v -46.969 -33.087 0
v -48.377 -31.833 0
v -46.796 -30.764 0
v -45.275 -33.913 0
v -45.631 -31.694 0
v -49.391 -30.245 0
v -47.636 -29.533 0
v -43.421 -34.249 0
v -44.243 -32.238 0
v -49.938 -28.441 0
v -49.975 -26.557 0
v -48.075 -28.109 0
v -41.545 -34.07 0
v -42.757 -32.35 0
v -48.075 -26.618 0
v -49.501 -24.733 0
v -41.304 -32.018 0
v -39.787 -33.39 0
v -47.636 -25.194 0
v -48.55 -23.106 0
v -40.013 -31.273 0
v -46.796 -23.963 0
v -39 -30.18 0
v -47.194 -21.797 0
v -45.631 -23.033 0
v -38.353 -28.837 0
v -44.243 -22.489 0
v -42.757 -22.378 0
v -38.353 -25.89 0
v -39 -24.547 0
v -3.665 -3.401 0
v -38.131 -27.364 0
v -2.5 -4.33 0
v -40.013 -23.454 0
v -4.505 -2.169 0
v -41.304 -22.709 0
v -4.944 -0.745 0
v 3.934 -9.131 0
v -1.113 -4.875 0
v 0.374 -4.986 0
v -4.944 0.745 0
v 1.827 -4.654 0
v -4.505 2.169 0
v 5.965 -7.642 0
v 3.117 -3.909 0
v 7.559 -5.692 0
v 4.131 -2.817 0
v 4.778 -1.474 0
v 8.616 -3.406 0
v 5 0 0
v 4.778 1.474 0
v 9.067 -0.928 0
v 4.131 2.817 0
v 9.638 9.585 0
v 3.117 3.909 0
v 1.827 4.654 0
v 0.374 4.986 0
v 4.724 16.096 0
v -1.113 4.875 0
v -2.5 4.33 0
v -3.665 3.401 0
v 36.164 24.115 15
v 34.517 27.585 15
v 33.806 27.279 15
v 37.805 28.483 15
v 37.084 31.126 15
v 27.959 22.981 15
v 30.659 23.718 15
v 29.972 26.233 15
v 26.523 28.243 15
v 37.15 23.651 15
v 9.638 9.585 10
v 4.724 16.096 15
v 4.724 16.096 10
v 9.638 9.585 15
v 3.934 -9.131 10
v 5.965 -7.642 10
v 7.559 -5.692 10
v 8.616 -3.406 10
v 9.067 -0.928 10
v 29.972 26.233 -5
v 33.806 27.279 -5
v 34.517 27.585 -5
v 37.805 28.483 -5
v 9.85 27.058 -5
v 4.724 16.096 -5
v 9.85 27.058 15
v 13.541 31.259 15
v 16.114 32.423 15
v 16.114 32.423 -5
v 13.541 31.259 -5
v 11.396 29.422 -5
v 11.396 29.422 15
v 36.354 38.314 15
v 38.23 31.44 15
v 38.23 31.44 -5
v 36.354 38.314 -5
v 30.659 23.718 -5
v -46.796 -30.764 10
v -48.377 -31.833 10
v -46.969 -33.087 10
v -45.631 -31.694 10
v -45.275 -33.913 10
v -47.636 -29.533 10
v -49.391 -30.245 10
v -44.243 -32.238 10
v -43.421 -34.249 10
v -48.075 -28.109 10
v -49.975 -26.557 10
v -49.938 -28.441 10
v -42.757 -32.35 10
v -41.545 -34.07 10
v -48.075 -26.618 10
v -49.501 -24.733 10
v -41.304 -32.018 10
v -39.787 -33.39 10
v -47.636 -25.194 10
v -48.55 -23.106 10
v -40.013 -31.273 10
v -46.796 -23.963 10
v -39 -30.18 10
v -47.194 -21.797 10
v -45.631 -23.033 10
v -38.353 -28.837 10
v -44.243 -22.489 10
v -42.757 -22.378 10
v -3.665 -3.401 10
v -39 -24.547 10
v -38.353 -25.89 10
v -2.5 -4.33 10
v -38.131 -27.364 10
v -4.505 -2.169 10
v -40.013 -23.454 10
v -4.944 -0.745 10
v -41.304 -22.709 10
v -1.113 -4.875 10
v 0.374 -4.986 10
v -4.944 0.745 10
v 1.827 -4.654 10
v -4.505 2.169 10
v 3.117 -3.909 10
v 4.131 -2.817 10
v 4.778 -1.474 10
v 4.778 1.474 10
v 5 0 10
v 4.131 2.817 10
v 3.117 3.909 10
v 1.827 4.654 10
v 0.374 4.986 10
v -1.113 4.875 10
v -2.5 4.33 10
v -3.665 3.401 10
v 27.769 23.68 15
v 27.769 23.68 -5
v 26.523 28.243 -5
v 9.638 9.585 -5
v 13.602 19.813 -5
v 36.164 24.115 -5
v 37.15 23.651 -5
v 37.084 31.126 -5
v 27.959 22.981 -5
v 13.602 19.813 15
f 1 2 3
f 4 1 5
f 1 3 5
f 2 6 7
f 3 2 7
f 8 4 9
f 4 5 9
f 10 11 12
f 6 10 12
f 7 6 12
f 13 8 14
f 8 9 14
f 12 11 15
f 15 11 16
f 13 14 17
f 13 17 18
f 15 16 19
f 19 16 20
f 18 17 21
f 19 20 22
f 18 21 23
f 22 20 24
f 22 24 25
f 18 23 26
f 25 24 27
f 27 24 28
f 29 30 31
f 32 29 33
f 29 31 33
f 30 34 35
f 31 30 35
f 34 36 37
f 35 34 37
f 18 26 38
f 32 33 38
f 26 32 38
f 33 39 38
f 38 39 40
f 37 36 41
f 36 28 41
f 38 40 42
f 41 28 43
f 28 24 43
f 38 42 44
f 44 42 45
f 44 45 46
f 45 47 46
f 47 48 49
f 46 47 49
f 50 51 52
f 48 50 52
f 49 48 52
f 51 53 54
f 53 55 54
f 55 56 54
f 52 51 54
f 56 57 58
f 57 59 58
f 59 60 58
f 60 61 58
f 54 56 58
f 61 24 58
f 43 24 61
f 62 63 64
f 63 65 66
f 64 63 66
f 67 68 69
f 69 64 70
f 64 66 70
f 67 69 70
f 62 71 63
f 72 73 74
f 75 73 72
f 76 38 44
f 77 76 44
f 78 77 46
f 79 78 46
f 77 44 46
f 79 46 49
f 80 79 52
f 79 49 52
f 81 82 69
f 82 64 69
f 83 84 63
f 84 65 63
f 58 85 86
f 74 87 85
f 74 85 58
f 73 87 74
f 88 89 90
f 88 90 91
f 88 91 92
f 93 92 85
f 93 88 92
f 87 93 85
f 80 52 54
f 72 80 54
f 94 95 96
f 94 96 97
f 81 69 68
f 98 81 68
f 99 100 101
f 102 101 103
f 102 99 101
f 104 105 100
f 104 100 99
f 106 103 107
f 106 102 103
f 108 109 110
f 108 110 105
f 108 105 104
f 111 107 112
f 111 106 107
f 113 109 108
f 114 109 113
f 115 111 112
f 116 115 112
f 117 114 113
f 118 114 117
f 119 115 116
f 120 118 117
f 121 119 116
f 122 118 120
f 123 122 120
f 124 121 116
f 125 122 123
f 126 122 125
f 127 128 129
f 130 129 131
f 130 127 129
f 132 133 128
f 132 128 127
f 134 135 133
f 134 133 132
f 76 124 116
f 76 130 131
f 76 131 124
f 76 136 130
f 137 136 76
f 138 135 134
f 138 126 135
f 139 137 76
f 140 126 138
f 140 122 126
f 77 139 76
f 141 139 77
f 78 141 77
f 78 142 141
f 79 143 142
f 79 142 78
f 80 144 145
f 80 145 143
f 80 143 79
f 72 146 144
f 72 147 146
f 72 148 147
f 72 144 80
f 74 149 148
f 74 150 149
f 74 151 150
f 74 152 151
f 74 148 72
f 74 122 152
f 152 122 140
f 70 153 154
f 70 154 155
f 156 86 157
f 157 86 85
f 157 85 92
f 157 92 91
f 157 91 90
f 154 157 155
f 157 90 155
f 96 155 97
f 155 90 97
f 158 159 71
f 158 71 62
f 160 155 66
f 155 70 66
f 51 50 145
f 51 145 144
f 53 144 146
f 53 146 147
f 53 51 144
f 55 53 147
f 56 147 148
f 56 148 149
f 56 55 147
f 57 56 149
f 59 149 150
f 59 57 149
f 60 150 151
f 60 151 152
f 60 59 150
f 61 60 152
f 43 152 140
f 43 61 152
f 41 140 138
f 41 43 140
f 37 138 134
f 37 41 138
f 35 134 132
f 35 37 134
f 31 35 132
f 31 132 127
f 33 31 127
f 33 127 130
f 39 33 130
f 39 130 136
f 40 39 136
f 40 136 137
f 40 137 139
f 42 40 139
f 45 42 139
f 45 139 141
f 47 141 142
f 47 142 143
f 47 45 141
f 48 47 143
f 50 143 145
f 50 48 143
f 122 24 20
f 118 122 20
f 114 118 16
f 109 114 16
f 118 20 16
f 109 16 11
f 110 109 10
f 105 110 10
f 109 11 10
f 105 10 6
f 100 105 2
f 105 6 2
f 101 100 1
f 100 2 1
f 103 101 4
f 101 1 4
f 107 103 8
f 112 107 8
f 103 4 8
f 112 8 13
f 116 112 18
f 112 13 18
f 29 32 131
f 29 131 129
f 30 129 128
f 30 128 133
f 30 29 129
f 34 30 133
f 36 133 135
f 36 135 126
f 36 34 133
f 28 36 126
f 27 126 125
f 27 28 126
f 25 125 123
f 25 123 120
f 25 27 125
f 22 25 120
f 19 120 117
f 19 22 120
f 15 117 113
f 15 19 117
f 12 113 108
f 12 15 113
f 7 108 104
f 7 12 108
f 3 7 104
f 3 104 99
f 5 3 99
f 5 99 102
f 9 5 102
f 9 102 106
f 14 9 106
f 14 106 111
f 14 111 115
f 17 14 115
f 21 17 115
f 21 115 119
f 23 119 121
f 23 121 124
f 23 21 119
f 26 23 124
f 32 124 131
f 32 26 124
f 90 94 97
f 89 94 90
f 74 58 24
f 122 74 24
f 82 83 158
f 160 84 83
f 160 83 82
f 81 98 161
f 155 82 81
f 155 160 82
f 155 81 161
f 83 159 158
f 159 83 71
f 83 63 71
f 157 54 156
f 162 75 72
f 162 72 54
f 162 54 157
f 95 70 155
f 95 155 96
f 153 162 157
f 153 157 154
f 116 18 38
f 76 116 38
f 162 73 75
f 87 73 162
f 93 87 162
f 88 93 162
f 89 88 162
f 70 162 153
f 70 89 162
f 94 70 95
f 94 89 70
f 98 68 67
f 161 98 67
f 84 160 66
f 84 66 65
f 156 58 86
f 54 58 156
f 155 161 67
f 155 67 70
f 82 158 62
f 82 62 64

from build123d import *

# Parameters (mm, degrees)
SKETCH_1_R      = 5
EXTRUDE_1_DEPTH = 10
EXTRUDE_2_DEPTH = 10
EXTRUDE_3_DEPTH = 10


with BuildPart() as part:
    # 草图1 → 凸台-拉伸1 (new body)
    with BuildSketch(Plane.XY):
        with BuildLine():
            Line((10.207680571, 20.09846448), (-47.193739247, -21.796773851))
            ThreePointArc((-47.193739247, -21.796773851), (-48.938446672, -31.074098067), (-39.786963622, -33.389936271))
            Line((-39.786963622, -33.389936271), (3.933872673, -9.131154899))
            ThreePointArc((3.933872673, -9.131154899), (7.558896736, -5.692097923), (9.067445715, -0.928465662))
            Line((9.067445715, -0.928465662), (10.207680571, 20.09846448))
        make_face()
        Circle(SKETCH_1_R, mode=Mode.SUBTRACT)
        with Locations((-43.130720056, -27.363589547)):
            Circle(SKETCH_1_R, mode=Mode.SUBTRACT)
    extrude(amount=EXTRUDE_1_DEPTH)

    # 草图2 → 凸台-拉伸2 (add, symmetric)
    with BuildSketch(Plane.XY.offset(5)):
        with BuildLine():
            Line((9.637563143, 9.584999409), (13.60218242, 19.812647766))
            Line((13.60218242, 19.812647766), (27.768612438, 23.680194348))
            Line((27.768612438, 23.680194348), (26.522849943, 28.243295743))
            Line((26.522849943, 28.243295743), (38.23040149, 31.439549204))
            Line((38.23040149, 31.439549204), (36.353581581, 38.314149761))
            Line((36.353581581, 38.314149761), (16.113798559, 32.423466643))
            ThreePointArc((16.113798559, 32.423466643), (12.402880543, 30.416570646), (9.849831601, 27.057927293))
            Line((9.849831601, 27.057927293), (4.723539283, 16.095786375))
            Line((4.723539283, 16.095786375), (9.637563143, 9.584999409))
        make_face()
    extrude(amount=EXTRUDE_2_DEPTH, both=True)


with BuildPart() as body_2:
    # 草图3 → 凸台-拉伸3 (new body, symmetric)
    with BuildSketch(Plane.XY.offset(5)):
        Polygon((27.959492024, 22.981021825), (26.522849943, 28.243295743), (37.083583517, 31.126458896), (37.805217266, 28.483187822), (34.516719177, 27.585402033), (37.150165431, 23.650963909), (36.164364178, 24.114585883), (33.805939355, 27.27930979), (29.972019118, 26.232619475), (30.658560366, 23.717888666), align=None)
    extrude(amount=EXTRUDE_3_DEPTH, both=True)


solid = Compound([part.part, body_2.part])
